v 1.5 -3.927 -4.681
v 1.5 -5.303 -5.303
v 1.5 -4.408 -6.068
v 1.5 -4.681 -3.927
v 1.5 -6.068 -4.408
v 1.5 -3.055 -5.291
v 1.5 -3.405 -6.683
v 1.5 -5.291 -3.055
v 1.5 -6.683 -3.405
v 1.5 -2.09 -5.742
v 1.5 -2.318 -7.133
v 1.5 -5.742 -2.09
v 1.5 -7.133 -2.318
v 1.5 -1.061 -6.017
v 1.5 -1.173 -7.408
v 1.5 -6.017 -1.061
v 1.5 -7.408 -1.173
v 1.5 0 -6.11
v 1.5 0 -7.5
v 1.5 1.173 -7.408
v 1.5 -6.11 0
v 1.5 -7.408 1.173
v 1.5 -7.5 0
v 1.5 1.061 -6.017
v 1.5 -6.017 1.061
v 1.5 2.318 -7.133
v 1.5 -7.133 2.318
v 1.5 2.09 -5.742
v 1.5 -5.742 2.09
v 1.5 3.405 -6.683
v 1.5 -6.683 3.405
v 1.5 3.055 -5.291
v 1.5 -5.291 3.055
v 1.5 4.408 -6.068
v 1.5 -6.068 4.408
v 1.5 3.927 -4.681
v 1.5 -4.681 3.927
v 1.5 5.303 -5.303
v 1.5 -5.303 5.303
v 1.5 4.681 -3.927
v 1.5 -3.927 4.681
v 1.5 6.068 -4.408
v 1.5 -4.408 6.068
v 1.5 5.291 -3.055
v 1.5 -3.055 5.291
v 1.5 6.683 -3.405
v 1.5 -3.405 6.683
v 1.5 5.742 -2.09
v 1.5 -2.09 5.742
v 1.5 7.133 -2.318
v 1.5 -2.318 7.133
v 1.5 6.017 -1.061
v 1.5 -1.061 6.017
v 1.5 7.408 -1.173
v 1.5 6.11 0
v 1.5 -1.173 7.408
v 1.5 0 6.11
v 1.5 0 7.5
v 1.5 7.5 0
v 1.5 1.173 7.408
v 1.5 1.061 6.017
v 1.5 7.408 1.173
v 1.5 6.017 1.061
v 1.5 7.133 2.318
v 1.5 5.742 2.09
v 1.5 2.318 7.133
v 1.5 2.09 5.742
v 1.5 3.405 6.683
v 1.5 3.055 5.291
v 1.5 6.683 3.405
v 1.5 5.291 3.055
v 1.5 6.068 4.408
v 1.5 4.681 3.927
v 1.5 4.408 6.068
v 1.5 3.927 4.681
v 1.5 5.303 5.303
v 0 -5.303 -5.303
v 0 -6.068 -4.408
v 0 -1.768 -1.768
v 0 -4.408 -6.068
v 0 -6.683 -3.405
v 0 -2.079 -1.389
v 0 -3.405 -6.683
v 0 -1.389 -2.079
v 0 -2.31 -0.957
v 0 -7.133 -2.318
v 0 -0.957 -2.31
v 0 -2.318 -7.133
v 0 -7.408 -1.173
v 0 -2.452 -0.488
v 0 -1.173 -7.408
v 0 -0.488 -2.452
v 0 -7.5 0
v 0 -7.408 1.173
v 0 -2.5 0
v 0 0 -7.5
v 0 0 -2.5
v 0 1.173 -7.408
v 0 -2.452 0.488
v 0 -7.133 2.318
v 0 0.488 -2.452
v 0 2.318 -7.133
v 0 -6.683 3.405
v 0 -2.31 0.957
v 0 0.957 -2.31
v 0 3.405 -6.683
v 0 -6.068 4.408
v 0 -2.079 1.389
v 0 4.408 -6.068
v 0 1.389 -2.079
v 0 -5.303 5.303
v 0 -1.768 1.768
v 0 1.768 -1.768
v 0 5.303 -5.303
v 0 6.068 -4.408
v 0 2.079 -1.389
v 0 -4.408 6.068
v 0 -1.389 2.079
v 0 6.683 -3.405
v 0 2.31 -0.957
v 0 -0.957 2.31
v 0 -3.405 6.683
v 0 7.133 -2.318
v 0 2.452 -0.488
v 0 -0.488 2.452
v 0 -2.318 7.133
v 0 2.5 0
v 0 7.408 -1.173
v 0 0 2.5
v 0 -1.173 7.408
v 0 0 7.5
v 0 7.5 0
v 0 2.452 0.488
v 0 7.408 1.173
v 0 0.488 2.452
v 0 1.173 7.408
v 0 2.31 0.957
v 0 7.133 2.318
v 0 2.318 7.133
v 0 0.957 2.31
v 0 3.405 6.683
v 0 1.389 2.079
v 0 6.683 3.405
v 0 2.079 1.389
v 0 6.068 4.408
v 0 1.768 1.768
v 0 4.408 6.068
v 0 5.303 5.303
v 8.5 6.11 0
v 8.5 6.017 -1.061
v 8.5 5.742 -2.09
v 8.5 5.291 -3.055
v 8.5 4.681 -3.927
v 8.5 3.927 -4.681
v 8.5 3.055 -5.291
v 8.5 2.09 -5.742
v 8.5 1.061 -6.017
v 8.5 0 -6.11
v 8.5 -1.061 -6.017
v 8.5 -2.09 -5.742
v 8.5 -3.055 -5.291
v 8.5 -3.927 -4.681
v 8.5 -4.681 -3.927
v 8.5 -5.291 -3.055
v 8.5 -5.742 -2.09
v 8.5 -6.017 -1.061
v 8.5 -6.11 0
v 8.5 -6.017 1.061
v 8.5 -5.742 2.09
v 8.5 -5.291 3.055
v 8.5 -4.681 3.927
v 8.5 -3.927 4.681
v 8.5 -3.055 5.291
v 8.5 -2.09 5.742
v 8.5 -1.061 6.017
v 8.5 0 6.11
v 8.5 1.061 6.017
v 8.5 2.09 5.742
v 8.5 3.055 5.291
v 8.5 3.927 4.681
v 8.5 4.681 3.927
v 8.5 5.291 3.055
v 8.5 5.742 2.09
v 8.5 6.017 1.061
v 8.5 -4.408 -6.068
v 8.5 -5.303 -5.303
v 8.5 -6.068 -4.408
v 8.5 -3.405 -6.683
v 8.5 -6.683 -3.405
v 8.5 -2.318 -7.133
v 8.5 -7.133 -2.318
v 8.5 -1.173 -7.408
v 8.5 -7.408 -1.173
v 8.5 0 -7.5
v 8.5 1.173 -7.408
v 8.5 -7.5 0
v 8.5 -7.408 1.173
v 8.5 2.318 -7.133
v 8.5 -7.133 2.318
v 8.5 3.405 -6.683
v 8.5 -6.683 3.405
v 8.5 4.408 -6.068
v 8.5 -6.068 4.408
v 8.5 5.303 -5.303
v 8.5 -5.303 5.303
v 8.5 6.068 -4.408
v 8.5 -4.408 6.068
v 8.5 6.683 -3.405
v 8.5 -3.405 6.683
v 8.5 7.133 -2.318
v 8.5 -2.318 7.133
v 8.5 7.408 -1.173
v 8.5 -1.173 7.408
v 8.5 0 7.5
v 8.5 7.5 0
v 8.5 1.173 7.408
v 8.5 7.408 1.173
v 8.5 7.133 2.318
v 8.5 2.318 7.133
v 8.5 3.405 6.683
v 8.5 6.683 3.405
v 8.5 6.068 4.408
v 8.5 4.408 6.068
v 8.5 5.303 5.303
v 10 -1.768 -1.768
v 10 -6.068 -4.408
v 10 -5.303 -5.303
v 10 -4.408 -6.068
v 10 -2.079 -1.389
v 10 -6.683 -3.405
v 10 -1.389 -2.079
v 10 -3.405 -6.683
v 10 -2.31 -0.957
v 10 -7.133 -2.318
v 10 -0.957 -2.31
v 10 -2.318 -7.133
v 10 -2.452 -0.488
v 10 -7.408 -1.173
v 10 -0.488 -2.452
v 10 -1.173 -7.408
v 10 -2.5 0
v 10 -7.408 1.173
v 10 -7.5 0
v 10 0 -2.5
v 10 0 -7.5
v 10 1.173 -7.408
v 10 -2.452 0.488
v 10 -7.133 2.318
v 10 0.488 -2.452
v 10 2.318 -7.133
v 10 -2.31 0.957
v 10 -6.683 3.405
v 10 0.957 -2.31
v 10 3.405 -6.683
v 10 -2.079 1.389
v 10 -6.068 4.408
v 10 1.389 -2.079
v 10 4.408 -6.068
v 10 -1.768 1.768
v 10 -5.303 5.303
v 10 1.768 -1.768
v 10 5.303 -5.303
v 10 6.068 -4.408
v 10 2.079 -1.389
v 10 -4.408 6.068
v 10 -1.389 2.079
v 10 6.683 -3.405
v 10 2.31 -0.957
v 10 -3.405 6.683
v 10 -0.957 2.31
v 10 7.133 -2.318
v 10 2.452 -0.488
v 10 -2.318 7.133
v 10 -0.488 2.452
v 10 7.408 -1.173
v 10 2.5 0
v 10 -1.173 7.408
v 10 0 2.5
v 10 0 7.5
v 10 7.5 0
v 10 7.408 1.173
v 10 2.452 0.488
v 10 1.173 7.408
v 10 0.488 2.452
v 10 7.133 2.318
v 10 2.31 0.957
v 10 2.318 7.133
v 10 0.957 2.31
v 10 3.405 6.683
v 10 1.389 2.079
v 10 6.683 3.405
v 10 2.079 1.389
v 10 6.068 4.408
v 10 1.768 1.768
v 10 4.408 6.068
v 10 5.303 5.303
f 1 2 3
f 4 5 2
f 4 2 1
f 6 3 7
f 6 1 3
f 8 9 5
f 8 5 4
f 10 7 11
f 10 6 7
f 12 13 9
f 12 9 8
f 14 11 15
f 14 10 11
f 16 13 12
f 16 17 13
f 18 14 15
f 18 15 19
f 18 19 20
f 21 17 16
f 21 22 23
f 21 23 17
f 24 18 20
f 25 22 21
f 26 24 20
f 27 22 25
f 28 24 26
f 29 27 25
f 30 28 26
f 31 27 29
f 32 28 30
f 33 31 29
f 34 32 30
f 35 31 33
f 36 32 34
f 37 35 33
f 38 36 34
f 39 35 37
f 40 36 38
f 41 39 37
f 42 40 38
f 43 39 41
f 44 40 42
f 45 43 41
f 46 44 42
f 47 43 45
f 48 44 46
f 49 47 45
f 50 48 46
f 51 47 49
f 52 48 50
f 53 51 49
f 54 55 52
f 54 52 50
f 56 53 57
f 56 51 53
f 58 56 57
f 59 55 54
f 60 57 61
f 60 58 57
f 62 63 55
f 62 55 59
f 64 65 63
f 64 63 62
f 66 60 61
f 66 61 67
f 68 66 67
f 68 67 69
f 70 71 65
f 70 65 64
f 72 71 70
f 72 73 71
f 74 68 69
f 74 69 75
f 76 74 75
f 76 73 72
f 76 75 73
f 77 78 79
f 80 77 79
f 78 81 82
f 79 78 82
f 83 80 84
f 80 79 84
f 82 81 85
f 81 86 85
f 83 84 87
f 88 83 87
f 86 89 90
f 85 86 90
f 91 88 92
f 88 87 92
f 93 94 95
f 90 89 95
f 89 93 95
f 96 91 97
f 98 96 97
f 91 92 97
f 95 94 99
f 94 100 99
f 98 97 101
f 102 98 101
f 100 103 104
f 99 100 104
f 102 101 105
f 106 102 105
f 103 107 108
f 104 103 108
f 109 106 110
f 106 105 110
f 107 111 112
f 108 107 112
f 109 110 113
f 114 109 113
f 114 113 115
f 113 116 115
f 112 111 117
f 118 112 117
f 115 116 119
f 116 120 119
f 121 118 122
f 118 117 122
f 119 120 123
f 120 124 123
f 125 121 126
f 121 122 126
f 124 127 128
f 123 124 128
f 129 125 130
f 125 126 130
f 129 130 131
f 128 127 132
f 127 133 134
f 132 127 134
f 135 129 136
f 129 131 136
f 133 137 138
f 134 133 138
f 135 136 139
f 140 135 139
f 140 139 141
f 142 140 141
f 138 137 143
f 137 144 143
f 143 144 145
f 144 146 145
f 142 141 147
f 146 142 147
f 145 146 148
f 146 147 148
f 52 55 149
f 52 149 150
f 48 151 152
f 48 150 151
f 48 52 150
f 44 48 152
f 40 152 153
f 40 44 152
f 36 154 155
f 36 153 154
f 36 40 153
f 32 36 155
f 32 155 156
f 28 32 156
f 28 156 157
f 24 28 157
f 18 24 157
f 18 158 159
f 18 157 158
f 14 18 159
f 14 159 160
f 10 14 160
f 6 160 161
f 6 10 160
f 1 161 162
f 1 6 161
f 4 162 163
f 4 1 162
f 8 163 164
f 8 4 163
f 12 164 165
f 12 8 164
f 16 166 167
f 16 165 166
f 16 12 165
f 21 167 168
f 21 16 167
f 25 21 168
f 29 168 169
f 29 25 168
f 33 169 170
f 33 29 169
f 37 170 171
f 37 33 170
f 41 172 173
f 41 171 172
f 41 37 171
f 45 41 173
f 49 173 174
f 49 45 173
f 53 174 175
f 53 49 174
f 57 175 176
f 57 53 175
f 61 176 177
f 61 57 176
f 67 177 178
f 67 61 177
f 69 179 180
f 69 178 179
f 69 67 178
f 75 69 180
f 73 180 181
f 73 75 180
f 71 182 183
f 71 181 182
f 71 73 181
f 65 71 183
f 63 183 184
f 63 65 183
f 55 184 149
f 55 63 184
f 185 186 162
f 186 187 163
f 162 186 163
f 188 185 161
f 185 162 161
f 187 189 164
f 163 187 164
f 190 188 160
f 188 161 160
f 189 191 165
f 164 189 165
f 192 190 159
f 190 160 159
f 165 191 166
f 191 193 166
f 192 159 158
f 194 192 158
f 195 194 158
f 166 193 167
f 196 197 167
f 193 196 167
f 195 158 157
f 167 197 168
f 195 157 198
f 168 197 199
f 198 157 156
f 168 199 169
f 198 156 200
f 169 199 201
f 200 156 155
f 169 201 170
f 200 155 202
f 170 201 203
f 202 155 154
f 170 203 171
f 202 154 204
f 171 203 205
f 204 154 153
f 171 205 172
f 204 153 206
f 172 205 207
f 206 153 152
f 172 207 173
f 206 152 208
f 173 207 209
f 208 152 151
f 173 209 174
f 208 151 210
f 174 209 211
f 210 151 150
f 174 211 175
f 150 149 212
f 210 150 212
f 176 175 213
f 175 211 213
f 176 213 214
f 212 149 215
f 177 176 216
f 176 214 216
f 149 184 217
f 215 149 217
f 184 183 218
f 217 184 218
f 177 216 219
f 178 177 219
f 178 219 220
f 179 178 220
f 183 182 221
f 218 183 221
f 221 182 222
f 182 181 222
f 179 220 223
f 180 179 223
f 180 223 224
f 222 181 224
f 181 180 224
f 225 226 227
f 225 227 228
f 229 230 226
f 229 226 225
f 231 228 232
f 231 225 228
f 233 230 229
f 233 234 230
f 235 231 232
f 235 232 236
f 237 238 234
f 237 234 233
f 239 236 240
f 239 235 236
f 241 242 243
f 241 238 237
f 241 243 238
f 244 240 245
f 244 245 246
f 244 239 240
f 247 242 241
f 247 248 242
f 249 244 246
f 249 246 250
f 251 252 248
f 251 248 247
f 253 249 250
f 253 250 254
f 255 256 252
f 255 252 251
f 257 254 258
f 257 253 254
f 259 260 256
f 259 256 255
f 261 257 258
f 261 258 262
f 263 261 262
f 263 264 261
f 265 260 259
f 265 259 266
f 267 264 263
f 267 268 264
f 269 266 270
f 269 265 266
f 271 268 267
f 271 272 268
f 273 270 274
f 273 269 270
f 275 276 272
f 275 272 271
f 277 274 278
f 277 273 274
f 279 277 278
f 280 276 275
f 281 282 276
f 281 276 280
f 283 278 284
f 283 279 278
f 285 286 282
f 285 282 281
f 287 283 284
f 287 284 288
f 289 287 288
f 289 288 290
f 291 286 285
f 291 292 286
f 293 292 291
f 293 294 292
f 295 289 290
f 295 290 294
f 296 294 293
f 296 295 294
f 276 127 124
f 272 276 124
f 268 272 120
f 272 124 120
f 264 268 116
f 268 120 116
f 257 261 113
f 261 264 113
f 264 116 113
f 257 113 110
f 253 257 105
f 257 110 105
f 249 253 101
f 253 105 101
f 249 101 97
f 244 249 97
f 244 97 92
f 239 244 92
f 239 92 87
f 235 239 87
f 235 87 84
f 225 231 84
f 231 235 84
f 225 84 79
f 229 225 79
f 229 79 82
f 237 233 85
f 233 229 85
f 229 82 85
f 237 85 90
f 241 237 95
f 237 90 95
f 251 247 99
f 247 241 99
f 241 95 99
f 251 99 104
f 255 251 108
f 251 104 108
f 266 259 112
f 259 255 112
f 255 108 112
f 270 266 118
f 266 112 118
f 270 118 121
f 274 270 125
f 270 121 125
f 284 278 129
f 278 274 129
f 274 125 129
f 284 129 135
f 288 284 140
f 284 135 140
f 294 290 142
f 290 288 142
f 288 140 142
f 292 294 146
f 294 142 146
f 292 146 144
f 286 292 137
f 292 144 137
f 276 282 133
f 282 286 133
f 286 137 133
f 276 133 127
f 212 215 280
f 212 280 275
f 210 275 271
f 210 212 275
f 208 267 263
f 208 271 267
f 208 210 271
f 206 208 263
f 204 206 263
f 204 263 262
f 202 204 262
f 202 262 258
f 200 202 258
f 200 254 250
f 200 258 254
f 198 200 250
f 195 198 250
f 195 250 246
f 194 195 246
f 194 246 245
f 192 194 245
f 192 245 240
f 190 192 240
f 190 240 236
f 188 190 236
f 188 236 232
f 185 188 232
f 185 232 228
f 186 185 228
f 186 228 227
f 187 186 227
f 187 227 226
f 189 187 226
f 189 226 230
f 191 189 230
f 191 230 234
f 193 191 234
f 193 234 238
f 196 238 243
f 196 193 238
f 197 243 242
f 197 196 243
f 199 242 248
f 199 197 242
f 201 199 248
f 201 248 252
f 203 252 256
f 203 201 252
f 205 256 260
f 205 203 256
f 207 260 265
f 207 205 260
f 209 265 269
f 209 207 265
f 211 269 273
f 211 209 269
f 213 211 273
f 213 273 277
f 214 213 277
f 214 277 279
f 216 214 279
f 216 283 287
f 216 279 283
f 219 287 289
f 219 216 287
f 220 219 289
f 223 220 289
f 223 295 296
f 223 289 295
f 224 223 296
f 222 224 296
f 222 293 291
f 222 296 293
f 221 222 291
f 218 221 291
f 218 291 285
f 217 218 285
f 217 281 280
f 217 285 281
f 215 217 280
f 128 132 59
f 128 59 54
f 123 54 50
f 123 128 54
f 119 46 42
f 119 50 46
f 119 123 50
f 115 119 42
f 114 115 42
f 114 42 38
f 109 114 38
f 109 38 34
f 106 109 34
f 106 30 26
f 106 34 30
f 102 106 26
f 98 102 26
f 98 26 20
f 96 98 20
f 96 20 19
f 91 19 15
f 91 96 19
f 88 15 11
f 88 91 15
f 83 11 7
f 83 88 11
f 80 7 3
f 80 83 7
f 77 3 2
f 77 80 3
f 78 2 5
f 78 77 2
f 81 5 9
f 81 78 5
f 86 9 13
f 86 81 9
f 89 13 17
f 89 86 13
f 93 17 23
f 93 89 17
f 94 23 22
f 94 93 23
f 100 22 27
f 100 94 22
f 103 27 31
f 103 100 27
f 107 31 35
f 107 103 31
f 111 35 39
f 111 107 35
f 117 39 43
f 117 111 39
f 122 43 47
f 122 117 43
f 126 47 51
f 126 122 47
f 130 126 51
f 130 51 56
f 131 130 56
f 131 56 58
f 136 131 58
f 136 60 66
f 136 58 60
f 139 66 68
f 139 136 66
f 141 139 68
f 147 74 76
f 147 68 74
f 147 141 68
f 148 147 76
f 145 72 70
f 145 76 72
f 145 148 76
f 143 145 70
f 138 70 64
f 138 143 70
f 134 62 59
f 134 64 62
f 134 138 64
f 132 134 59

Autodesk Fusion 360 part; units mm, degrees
sketch "Sketch1" plane through (0, 0, 0) normal (1, 0, 0) x (0, 1, 0)
  circle A0 centre (0, 0) radius 6.11
  circle A1 centre (0, 0) radius 7.5
  circle A2 centre (0, 0) radius 2.5
  circle A3 centre (0, 0) radius 6.365 construction
  dimension "d1" = 5
  dimension "d2" = 12.22
  dimension "d3" = 15
  dimension "d11" = 12.73
extrude "Extrude1" add sketch "Sketch1" along normal blind 10 contours A0 | A1
extrude "Extrude2" cut sketch "Sketch1" along normal blind 7 from surface at 1.5 contours A1
equation "d2 = outside_dia"
equation "pitch_dia = 12.73 mm"
equation "outside_dia = 12.22 mm"
equation "d11 = pitch_dia"
